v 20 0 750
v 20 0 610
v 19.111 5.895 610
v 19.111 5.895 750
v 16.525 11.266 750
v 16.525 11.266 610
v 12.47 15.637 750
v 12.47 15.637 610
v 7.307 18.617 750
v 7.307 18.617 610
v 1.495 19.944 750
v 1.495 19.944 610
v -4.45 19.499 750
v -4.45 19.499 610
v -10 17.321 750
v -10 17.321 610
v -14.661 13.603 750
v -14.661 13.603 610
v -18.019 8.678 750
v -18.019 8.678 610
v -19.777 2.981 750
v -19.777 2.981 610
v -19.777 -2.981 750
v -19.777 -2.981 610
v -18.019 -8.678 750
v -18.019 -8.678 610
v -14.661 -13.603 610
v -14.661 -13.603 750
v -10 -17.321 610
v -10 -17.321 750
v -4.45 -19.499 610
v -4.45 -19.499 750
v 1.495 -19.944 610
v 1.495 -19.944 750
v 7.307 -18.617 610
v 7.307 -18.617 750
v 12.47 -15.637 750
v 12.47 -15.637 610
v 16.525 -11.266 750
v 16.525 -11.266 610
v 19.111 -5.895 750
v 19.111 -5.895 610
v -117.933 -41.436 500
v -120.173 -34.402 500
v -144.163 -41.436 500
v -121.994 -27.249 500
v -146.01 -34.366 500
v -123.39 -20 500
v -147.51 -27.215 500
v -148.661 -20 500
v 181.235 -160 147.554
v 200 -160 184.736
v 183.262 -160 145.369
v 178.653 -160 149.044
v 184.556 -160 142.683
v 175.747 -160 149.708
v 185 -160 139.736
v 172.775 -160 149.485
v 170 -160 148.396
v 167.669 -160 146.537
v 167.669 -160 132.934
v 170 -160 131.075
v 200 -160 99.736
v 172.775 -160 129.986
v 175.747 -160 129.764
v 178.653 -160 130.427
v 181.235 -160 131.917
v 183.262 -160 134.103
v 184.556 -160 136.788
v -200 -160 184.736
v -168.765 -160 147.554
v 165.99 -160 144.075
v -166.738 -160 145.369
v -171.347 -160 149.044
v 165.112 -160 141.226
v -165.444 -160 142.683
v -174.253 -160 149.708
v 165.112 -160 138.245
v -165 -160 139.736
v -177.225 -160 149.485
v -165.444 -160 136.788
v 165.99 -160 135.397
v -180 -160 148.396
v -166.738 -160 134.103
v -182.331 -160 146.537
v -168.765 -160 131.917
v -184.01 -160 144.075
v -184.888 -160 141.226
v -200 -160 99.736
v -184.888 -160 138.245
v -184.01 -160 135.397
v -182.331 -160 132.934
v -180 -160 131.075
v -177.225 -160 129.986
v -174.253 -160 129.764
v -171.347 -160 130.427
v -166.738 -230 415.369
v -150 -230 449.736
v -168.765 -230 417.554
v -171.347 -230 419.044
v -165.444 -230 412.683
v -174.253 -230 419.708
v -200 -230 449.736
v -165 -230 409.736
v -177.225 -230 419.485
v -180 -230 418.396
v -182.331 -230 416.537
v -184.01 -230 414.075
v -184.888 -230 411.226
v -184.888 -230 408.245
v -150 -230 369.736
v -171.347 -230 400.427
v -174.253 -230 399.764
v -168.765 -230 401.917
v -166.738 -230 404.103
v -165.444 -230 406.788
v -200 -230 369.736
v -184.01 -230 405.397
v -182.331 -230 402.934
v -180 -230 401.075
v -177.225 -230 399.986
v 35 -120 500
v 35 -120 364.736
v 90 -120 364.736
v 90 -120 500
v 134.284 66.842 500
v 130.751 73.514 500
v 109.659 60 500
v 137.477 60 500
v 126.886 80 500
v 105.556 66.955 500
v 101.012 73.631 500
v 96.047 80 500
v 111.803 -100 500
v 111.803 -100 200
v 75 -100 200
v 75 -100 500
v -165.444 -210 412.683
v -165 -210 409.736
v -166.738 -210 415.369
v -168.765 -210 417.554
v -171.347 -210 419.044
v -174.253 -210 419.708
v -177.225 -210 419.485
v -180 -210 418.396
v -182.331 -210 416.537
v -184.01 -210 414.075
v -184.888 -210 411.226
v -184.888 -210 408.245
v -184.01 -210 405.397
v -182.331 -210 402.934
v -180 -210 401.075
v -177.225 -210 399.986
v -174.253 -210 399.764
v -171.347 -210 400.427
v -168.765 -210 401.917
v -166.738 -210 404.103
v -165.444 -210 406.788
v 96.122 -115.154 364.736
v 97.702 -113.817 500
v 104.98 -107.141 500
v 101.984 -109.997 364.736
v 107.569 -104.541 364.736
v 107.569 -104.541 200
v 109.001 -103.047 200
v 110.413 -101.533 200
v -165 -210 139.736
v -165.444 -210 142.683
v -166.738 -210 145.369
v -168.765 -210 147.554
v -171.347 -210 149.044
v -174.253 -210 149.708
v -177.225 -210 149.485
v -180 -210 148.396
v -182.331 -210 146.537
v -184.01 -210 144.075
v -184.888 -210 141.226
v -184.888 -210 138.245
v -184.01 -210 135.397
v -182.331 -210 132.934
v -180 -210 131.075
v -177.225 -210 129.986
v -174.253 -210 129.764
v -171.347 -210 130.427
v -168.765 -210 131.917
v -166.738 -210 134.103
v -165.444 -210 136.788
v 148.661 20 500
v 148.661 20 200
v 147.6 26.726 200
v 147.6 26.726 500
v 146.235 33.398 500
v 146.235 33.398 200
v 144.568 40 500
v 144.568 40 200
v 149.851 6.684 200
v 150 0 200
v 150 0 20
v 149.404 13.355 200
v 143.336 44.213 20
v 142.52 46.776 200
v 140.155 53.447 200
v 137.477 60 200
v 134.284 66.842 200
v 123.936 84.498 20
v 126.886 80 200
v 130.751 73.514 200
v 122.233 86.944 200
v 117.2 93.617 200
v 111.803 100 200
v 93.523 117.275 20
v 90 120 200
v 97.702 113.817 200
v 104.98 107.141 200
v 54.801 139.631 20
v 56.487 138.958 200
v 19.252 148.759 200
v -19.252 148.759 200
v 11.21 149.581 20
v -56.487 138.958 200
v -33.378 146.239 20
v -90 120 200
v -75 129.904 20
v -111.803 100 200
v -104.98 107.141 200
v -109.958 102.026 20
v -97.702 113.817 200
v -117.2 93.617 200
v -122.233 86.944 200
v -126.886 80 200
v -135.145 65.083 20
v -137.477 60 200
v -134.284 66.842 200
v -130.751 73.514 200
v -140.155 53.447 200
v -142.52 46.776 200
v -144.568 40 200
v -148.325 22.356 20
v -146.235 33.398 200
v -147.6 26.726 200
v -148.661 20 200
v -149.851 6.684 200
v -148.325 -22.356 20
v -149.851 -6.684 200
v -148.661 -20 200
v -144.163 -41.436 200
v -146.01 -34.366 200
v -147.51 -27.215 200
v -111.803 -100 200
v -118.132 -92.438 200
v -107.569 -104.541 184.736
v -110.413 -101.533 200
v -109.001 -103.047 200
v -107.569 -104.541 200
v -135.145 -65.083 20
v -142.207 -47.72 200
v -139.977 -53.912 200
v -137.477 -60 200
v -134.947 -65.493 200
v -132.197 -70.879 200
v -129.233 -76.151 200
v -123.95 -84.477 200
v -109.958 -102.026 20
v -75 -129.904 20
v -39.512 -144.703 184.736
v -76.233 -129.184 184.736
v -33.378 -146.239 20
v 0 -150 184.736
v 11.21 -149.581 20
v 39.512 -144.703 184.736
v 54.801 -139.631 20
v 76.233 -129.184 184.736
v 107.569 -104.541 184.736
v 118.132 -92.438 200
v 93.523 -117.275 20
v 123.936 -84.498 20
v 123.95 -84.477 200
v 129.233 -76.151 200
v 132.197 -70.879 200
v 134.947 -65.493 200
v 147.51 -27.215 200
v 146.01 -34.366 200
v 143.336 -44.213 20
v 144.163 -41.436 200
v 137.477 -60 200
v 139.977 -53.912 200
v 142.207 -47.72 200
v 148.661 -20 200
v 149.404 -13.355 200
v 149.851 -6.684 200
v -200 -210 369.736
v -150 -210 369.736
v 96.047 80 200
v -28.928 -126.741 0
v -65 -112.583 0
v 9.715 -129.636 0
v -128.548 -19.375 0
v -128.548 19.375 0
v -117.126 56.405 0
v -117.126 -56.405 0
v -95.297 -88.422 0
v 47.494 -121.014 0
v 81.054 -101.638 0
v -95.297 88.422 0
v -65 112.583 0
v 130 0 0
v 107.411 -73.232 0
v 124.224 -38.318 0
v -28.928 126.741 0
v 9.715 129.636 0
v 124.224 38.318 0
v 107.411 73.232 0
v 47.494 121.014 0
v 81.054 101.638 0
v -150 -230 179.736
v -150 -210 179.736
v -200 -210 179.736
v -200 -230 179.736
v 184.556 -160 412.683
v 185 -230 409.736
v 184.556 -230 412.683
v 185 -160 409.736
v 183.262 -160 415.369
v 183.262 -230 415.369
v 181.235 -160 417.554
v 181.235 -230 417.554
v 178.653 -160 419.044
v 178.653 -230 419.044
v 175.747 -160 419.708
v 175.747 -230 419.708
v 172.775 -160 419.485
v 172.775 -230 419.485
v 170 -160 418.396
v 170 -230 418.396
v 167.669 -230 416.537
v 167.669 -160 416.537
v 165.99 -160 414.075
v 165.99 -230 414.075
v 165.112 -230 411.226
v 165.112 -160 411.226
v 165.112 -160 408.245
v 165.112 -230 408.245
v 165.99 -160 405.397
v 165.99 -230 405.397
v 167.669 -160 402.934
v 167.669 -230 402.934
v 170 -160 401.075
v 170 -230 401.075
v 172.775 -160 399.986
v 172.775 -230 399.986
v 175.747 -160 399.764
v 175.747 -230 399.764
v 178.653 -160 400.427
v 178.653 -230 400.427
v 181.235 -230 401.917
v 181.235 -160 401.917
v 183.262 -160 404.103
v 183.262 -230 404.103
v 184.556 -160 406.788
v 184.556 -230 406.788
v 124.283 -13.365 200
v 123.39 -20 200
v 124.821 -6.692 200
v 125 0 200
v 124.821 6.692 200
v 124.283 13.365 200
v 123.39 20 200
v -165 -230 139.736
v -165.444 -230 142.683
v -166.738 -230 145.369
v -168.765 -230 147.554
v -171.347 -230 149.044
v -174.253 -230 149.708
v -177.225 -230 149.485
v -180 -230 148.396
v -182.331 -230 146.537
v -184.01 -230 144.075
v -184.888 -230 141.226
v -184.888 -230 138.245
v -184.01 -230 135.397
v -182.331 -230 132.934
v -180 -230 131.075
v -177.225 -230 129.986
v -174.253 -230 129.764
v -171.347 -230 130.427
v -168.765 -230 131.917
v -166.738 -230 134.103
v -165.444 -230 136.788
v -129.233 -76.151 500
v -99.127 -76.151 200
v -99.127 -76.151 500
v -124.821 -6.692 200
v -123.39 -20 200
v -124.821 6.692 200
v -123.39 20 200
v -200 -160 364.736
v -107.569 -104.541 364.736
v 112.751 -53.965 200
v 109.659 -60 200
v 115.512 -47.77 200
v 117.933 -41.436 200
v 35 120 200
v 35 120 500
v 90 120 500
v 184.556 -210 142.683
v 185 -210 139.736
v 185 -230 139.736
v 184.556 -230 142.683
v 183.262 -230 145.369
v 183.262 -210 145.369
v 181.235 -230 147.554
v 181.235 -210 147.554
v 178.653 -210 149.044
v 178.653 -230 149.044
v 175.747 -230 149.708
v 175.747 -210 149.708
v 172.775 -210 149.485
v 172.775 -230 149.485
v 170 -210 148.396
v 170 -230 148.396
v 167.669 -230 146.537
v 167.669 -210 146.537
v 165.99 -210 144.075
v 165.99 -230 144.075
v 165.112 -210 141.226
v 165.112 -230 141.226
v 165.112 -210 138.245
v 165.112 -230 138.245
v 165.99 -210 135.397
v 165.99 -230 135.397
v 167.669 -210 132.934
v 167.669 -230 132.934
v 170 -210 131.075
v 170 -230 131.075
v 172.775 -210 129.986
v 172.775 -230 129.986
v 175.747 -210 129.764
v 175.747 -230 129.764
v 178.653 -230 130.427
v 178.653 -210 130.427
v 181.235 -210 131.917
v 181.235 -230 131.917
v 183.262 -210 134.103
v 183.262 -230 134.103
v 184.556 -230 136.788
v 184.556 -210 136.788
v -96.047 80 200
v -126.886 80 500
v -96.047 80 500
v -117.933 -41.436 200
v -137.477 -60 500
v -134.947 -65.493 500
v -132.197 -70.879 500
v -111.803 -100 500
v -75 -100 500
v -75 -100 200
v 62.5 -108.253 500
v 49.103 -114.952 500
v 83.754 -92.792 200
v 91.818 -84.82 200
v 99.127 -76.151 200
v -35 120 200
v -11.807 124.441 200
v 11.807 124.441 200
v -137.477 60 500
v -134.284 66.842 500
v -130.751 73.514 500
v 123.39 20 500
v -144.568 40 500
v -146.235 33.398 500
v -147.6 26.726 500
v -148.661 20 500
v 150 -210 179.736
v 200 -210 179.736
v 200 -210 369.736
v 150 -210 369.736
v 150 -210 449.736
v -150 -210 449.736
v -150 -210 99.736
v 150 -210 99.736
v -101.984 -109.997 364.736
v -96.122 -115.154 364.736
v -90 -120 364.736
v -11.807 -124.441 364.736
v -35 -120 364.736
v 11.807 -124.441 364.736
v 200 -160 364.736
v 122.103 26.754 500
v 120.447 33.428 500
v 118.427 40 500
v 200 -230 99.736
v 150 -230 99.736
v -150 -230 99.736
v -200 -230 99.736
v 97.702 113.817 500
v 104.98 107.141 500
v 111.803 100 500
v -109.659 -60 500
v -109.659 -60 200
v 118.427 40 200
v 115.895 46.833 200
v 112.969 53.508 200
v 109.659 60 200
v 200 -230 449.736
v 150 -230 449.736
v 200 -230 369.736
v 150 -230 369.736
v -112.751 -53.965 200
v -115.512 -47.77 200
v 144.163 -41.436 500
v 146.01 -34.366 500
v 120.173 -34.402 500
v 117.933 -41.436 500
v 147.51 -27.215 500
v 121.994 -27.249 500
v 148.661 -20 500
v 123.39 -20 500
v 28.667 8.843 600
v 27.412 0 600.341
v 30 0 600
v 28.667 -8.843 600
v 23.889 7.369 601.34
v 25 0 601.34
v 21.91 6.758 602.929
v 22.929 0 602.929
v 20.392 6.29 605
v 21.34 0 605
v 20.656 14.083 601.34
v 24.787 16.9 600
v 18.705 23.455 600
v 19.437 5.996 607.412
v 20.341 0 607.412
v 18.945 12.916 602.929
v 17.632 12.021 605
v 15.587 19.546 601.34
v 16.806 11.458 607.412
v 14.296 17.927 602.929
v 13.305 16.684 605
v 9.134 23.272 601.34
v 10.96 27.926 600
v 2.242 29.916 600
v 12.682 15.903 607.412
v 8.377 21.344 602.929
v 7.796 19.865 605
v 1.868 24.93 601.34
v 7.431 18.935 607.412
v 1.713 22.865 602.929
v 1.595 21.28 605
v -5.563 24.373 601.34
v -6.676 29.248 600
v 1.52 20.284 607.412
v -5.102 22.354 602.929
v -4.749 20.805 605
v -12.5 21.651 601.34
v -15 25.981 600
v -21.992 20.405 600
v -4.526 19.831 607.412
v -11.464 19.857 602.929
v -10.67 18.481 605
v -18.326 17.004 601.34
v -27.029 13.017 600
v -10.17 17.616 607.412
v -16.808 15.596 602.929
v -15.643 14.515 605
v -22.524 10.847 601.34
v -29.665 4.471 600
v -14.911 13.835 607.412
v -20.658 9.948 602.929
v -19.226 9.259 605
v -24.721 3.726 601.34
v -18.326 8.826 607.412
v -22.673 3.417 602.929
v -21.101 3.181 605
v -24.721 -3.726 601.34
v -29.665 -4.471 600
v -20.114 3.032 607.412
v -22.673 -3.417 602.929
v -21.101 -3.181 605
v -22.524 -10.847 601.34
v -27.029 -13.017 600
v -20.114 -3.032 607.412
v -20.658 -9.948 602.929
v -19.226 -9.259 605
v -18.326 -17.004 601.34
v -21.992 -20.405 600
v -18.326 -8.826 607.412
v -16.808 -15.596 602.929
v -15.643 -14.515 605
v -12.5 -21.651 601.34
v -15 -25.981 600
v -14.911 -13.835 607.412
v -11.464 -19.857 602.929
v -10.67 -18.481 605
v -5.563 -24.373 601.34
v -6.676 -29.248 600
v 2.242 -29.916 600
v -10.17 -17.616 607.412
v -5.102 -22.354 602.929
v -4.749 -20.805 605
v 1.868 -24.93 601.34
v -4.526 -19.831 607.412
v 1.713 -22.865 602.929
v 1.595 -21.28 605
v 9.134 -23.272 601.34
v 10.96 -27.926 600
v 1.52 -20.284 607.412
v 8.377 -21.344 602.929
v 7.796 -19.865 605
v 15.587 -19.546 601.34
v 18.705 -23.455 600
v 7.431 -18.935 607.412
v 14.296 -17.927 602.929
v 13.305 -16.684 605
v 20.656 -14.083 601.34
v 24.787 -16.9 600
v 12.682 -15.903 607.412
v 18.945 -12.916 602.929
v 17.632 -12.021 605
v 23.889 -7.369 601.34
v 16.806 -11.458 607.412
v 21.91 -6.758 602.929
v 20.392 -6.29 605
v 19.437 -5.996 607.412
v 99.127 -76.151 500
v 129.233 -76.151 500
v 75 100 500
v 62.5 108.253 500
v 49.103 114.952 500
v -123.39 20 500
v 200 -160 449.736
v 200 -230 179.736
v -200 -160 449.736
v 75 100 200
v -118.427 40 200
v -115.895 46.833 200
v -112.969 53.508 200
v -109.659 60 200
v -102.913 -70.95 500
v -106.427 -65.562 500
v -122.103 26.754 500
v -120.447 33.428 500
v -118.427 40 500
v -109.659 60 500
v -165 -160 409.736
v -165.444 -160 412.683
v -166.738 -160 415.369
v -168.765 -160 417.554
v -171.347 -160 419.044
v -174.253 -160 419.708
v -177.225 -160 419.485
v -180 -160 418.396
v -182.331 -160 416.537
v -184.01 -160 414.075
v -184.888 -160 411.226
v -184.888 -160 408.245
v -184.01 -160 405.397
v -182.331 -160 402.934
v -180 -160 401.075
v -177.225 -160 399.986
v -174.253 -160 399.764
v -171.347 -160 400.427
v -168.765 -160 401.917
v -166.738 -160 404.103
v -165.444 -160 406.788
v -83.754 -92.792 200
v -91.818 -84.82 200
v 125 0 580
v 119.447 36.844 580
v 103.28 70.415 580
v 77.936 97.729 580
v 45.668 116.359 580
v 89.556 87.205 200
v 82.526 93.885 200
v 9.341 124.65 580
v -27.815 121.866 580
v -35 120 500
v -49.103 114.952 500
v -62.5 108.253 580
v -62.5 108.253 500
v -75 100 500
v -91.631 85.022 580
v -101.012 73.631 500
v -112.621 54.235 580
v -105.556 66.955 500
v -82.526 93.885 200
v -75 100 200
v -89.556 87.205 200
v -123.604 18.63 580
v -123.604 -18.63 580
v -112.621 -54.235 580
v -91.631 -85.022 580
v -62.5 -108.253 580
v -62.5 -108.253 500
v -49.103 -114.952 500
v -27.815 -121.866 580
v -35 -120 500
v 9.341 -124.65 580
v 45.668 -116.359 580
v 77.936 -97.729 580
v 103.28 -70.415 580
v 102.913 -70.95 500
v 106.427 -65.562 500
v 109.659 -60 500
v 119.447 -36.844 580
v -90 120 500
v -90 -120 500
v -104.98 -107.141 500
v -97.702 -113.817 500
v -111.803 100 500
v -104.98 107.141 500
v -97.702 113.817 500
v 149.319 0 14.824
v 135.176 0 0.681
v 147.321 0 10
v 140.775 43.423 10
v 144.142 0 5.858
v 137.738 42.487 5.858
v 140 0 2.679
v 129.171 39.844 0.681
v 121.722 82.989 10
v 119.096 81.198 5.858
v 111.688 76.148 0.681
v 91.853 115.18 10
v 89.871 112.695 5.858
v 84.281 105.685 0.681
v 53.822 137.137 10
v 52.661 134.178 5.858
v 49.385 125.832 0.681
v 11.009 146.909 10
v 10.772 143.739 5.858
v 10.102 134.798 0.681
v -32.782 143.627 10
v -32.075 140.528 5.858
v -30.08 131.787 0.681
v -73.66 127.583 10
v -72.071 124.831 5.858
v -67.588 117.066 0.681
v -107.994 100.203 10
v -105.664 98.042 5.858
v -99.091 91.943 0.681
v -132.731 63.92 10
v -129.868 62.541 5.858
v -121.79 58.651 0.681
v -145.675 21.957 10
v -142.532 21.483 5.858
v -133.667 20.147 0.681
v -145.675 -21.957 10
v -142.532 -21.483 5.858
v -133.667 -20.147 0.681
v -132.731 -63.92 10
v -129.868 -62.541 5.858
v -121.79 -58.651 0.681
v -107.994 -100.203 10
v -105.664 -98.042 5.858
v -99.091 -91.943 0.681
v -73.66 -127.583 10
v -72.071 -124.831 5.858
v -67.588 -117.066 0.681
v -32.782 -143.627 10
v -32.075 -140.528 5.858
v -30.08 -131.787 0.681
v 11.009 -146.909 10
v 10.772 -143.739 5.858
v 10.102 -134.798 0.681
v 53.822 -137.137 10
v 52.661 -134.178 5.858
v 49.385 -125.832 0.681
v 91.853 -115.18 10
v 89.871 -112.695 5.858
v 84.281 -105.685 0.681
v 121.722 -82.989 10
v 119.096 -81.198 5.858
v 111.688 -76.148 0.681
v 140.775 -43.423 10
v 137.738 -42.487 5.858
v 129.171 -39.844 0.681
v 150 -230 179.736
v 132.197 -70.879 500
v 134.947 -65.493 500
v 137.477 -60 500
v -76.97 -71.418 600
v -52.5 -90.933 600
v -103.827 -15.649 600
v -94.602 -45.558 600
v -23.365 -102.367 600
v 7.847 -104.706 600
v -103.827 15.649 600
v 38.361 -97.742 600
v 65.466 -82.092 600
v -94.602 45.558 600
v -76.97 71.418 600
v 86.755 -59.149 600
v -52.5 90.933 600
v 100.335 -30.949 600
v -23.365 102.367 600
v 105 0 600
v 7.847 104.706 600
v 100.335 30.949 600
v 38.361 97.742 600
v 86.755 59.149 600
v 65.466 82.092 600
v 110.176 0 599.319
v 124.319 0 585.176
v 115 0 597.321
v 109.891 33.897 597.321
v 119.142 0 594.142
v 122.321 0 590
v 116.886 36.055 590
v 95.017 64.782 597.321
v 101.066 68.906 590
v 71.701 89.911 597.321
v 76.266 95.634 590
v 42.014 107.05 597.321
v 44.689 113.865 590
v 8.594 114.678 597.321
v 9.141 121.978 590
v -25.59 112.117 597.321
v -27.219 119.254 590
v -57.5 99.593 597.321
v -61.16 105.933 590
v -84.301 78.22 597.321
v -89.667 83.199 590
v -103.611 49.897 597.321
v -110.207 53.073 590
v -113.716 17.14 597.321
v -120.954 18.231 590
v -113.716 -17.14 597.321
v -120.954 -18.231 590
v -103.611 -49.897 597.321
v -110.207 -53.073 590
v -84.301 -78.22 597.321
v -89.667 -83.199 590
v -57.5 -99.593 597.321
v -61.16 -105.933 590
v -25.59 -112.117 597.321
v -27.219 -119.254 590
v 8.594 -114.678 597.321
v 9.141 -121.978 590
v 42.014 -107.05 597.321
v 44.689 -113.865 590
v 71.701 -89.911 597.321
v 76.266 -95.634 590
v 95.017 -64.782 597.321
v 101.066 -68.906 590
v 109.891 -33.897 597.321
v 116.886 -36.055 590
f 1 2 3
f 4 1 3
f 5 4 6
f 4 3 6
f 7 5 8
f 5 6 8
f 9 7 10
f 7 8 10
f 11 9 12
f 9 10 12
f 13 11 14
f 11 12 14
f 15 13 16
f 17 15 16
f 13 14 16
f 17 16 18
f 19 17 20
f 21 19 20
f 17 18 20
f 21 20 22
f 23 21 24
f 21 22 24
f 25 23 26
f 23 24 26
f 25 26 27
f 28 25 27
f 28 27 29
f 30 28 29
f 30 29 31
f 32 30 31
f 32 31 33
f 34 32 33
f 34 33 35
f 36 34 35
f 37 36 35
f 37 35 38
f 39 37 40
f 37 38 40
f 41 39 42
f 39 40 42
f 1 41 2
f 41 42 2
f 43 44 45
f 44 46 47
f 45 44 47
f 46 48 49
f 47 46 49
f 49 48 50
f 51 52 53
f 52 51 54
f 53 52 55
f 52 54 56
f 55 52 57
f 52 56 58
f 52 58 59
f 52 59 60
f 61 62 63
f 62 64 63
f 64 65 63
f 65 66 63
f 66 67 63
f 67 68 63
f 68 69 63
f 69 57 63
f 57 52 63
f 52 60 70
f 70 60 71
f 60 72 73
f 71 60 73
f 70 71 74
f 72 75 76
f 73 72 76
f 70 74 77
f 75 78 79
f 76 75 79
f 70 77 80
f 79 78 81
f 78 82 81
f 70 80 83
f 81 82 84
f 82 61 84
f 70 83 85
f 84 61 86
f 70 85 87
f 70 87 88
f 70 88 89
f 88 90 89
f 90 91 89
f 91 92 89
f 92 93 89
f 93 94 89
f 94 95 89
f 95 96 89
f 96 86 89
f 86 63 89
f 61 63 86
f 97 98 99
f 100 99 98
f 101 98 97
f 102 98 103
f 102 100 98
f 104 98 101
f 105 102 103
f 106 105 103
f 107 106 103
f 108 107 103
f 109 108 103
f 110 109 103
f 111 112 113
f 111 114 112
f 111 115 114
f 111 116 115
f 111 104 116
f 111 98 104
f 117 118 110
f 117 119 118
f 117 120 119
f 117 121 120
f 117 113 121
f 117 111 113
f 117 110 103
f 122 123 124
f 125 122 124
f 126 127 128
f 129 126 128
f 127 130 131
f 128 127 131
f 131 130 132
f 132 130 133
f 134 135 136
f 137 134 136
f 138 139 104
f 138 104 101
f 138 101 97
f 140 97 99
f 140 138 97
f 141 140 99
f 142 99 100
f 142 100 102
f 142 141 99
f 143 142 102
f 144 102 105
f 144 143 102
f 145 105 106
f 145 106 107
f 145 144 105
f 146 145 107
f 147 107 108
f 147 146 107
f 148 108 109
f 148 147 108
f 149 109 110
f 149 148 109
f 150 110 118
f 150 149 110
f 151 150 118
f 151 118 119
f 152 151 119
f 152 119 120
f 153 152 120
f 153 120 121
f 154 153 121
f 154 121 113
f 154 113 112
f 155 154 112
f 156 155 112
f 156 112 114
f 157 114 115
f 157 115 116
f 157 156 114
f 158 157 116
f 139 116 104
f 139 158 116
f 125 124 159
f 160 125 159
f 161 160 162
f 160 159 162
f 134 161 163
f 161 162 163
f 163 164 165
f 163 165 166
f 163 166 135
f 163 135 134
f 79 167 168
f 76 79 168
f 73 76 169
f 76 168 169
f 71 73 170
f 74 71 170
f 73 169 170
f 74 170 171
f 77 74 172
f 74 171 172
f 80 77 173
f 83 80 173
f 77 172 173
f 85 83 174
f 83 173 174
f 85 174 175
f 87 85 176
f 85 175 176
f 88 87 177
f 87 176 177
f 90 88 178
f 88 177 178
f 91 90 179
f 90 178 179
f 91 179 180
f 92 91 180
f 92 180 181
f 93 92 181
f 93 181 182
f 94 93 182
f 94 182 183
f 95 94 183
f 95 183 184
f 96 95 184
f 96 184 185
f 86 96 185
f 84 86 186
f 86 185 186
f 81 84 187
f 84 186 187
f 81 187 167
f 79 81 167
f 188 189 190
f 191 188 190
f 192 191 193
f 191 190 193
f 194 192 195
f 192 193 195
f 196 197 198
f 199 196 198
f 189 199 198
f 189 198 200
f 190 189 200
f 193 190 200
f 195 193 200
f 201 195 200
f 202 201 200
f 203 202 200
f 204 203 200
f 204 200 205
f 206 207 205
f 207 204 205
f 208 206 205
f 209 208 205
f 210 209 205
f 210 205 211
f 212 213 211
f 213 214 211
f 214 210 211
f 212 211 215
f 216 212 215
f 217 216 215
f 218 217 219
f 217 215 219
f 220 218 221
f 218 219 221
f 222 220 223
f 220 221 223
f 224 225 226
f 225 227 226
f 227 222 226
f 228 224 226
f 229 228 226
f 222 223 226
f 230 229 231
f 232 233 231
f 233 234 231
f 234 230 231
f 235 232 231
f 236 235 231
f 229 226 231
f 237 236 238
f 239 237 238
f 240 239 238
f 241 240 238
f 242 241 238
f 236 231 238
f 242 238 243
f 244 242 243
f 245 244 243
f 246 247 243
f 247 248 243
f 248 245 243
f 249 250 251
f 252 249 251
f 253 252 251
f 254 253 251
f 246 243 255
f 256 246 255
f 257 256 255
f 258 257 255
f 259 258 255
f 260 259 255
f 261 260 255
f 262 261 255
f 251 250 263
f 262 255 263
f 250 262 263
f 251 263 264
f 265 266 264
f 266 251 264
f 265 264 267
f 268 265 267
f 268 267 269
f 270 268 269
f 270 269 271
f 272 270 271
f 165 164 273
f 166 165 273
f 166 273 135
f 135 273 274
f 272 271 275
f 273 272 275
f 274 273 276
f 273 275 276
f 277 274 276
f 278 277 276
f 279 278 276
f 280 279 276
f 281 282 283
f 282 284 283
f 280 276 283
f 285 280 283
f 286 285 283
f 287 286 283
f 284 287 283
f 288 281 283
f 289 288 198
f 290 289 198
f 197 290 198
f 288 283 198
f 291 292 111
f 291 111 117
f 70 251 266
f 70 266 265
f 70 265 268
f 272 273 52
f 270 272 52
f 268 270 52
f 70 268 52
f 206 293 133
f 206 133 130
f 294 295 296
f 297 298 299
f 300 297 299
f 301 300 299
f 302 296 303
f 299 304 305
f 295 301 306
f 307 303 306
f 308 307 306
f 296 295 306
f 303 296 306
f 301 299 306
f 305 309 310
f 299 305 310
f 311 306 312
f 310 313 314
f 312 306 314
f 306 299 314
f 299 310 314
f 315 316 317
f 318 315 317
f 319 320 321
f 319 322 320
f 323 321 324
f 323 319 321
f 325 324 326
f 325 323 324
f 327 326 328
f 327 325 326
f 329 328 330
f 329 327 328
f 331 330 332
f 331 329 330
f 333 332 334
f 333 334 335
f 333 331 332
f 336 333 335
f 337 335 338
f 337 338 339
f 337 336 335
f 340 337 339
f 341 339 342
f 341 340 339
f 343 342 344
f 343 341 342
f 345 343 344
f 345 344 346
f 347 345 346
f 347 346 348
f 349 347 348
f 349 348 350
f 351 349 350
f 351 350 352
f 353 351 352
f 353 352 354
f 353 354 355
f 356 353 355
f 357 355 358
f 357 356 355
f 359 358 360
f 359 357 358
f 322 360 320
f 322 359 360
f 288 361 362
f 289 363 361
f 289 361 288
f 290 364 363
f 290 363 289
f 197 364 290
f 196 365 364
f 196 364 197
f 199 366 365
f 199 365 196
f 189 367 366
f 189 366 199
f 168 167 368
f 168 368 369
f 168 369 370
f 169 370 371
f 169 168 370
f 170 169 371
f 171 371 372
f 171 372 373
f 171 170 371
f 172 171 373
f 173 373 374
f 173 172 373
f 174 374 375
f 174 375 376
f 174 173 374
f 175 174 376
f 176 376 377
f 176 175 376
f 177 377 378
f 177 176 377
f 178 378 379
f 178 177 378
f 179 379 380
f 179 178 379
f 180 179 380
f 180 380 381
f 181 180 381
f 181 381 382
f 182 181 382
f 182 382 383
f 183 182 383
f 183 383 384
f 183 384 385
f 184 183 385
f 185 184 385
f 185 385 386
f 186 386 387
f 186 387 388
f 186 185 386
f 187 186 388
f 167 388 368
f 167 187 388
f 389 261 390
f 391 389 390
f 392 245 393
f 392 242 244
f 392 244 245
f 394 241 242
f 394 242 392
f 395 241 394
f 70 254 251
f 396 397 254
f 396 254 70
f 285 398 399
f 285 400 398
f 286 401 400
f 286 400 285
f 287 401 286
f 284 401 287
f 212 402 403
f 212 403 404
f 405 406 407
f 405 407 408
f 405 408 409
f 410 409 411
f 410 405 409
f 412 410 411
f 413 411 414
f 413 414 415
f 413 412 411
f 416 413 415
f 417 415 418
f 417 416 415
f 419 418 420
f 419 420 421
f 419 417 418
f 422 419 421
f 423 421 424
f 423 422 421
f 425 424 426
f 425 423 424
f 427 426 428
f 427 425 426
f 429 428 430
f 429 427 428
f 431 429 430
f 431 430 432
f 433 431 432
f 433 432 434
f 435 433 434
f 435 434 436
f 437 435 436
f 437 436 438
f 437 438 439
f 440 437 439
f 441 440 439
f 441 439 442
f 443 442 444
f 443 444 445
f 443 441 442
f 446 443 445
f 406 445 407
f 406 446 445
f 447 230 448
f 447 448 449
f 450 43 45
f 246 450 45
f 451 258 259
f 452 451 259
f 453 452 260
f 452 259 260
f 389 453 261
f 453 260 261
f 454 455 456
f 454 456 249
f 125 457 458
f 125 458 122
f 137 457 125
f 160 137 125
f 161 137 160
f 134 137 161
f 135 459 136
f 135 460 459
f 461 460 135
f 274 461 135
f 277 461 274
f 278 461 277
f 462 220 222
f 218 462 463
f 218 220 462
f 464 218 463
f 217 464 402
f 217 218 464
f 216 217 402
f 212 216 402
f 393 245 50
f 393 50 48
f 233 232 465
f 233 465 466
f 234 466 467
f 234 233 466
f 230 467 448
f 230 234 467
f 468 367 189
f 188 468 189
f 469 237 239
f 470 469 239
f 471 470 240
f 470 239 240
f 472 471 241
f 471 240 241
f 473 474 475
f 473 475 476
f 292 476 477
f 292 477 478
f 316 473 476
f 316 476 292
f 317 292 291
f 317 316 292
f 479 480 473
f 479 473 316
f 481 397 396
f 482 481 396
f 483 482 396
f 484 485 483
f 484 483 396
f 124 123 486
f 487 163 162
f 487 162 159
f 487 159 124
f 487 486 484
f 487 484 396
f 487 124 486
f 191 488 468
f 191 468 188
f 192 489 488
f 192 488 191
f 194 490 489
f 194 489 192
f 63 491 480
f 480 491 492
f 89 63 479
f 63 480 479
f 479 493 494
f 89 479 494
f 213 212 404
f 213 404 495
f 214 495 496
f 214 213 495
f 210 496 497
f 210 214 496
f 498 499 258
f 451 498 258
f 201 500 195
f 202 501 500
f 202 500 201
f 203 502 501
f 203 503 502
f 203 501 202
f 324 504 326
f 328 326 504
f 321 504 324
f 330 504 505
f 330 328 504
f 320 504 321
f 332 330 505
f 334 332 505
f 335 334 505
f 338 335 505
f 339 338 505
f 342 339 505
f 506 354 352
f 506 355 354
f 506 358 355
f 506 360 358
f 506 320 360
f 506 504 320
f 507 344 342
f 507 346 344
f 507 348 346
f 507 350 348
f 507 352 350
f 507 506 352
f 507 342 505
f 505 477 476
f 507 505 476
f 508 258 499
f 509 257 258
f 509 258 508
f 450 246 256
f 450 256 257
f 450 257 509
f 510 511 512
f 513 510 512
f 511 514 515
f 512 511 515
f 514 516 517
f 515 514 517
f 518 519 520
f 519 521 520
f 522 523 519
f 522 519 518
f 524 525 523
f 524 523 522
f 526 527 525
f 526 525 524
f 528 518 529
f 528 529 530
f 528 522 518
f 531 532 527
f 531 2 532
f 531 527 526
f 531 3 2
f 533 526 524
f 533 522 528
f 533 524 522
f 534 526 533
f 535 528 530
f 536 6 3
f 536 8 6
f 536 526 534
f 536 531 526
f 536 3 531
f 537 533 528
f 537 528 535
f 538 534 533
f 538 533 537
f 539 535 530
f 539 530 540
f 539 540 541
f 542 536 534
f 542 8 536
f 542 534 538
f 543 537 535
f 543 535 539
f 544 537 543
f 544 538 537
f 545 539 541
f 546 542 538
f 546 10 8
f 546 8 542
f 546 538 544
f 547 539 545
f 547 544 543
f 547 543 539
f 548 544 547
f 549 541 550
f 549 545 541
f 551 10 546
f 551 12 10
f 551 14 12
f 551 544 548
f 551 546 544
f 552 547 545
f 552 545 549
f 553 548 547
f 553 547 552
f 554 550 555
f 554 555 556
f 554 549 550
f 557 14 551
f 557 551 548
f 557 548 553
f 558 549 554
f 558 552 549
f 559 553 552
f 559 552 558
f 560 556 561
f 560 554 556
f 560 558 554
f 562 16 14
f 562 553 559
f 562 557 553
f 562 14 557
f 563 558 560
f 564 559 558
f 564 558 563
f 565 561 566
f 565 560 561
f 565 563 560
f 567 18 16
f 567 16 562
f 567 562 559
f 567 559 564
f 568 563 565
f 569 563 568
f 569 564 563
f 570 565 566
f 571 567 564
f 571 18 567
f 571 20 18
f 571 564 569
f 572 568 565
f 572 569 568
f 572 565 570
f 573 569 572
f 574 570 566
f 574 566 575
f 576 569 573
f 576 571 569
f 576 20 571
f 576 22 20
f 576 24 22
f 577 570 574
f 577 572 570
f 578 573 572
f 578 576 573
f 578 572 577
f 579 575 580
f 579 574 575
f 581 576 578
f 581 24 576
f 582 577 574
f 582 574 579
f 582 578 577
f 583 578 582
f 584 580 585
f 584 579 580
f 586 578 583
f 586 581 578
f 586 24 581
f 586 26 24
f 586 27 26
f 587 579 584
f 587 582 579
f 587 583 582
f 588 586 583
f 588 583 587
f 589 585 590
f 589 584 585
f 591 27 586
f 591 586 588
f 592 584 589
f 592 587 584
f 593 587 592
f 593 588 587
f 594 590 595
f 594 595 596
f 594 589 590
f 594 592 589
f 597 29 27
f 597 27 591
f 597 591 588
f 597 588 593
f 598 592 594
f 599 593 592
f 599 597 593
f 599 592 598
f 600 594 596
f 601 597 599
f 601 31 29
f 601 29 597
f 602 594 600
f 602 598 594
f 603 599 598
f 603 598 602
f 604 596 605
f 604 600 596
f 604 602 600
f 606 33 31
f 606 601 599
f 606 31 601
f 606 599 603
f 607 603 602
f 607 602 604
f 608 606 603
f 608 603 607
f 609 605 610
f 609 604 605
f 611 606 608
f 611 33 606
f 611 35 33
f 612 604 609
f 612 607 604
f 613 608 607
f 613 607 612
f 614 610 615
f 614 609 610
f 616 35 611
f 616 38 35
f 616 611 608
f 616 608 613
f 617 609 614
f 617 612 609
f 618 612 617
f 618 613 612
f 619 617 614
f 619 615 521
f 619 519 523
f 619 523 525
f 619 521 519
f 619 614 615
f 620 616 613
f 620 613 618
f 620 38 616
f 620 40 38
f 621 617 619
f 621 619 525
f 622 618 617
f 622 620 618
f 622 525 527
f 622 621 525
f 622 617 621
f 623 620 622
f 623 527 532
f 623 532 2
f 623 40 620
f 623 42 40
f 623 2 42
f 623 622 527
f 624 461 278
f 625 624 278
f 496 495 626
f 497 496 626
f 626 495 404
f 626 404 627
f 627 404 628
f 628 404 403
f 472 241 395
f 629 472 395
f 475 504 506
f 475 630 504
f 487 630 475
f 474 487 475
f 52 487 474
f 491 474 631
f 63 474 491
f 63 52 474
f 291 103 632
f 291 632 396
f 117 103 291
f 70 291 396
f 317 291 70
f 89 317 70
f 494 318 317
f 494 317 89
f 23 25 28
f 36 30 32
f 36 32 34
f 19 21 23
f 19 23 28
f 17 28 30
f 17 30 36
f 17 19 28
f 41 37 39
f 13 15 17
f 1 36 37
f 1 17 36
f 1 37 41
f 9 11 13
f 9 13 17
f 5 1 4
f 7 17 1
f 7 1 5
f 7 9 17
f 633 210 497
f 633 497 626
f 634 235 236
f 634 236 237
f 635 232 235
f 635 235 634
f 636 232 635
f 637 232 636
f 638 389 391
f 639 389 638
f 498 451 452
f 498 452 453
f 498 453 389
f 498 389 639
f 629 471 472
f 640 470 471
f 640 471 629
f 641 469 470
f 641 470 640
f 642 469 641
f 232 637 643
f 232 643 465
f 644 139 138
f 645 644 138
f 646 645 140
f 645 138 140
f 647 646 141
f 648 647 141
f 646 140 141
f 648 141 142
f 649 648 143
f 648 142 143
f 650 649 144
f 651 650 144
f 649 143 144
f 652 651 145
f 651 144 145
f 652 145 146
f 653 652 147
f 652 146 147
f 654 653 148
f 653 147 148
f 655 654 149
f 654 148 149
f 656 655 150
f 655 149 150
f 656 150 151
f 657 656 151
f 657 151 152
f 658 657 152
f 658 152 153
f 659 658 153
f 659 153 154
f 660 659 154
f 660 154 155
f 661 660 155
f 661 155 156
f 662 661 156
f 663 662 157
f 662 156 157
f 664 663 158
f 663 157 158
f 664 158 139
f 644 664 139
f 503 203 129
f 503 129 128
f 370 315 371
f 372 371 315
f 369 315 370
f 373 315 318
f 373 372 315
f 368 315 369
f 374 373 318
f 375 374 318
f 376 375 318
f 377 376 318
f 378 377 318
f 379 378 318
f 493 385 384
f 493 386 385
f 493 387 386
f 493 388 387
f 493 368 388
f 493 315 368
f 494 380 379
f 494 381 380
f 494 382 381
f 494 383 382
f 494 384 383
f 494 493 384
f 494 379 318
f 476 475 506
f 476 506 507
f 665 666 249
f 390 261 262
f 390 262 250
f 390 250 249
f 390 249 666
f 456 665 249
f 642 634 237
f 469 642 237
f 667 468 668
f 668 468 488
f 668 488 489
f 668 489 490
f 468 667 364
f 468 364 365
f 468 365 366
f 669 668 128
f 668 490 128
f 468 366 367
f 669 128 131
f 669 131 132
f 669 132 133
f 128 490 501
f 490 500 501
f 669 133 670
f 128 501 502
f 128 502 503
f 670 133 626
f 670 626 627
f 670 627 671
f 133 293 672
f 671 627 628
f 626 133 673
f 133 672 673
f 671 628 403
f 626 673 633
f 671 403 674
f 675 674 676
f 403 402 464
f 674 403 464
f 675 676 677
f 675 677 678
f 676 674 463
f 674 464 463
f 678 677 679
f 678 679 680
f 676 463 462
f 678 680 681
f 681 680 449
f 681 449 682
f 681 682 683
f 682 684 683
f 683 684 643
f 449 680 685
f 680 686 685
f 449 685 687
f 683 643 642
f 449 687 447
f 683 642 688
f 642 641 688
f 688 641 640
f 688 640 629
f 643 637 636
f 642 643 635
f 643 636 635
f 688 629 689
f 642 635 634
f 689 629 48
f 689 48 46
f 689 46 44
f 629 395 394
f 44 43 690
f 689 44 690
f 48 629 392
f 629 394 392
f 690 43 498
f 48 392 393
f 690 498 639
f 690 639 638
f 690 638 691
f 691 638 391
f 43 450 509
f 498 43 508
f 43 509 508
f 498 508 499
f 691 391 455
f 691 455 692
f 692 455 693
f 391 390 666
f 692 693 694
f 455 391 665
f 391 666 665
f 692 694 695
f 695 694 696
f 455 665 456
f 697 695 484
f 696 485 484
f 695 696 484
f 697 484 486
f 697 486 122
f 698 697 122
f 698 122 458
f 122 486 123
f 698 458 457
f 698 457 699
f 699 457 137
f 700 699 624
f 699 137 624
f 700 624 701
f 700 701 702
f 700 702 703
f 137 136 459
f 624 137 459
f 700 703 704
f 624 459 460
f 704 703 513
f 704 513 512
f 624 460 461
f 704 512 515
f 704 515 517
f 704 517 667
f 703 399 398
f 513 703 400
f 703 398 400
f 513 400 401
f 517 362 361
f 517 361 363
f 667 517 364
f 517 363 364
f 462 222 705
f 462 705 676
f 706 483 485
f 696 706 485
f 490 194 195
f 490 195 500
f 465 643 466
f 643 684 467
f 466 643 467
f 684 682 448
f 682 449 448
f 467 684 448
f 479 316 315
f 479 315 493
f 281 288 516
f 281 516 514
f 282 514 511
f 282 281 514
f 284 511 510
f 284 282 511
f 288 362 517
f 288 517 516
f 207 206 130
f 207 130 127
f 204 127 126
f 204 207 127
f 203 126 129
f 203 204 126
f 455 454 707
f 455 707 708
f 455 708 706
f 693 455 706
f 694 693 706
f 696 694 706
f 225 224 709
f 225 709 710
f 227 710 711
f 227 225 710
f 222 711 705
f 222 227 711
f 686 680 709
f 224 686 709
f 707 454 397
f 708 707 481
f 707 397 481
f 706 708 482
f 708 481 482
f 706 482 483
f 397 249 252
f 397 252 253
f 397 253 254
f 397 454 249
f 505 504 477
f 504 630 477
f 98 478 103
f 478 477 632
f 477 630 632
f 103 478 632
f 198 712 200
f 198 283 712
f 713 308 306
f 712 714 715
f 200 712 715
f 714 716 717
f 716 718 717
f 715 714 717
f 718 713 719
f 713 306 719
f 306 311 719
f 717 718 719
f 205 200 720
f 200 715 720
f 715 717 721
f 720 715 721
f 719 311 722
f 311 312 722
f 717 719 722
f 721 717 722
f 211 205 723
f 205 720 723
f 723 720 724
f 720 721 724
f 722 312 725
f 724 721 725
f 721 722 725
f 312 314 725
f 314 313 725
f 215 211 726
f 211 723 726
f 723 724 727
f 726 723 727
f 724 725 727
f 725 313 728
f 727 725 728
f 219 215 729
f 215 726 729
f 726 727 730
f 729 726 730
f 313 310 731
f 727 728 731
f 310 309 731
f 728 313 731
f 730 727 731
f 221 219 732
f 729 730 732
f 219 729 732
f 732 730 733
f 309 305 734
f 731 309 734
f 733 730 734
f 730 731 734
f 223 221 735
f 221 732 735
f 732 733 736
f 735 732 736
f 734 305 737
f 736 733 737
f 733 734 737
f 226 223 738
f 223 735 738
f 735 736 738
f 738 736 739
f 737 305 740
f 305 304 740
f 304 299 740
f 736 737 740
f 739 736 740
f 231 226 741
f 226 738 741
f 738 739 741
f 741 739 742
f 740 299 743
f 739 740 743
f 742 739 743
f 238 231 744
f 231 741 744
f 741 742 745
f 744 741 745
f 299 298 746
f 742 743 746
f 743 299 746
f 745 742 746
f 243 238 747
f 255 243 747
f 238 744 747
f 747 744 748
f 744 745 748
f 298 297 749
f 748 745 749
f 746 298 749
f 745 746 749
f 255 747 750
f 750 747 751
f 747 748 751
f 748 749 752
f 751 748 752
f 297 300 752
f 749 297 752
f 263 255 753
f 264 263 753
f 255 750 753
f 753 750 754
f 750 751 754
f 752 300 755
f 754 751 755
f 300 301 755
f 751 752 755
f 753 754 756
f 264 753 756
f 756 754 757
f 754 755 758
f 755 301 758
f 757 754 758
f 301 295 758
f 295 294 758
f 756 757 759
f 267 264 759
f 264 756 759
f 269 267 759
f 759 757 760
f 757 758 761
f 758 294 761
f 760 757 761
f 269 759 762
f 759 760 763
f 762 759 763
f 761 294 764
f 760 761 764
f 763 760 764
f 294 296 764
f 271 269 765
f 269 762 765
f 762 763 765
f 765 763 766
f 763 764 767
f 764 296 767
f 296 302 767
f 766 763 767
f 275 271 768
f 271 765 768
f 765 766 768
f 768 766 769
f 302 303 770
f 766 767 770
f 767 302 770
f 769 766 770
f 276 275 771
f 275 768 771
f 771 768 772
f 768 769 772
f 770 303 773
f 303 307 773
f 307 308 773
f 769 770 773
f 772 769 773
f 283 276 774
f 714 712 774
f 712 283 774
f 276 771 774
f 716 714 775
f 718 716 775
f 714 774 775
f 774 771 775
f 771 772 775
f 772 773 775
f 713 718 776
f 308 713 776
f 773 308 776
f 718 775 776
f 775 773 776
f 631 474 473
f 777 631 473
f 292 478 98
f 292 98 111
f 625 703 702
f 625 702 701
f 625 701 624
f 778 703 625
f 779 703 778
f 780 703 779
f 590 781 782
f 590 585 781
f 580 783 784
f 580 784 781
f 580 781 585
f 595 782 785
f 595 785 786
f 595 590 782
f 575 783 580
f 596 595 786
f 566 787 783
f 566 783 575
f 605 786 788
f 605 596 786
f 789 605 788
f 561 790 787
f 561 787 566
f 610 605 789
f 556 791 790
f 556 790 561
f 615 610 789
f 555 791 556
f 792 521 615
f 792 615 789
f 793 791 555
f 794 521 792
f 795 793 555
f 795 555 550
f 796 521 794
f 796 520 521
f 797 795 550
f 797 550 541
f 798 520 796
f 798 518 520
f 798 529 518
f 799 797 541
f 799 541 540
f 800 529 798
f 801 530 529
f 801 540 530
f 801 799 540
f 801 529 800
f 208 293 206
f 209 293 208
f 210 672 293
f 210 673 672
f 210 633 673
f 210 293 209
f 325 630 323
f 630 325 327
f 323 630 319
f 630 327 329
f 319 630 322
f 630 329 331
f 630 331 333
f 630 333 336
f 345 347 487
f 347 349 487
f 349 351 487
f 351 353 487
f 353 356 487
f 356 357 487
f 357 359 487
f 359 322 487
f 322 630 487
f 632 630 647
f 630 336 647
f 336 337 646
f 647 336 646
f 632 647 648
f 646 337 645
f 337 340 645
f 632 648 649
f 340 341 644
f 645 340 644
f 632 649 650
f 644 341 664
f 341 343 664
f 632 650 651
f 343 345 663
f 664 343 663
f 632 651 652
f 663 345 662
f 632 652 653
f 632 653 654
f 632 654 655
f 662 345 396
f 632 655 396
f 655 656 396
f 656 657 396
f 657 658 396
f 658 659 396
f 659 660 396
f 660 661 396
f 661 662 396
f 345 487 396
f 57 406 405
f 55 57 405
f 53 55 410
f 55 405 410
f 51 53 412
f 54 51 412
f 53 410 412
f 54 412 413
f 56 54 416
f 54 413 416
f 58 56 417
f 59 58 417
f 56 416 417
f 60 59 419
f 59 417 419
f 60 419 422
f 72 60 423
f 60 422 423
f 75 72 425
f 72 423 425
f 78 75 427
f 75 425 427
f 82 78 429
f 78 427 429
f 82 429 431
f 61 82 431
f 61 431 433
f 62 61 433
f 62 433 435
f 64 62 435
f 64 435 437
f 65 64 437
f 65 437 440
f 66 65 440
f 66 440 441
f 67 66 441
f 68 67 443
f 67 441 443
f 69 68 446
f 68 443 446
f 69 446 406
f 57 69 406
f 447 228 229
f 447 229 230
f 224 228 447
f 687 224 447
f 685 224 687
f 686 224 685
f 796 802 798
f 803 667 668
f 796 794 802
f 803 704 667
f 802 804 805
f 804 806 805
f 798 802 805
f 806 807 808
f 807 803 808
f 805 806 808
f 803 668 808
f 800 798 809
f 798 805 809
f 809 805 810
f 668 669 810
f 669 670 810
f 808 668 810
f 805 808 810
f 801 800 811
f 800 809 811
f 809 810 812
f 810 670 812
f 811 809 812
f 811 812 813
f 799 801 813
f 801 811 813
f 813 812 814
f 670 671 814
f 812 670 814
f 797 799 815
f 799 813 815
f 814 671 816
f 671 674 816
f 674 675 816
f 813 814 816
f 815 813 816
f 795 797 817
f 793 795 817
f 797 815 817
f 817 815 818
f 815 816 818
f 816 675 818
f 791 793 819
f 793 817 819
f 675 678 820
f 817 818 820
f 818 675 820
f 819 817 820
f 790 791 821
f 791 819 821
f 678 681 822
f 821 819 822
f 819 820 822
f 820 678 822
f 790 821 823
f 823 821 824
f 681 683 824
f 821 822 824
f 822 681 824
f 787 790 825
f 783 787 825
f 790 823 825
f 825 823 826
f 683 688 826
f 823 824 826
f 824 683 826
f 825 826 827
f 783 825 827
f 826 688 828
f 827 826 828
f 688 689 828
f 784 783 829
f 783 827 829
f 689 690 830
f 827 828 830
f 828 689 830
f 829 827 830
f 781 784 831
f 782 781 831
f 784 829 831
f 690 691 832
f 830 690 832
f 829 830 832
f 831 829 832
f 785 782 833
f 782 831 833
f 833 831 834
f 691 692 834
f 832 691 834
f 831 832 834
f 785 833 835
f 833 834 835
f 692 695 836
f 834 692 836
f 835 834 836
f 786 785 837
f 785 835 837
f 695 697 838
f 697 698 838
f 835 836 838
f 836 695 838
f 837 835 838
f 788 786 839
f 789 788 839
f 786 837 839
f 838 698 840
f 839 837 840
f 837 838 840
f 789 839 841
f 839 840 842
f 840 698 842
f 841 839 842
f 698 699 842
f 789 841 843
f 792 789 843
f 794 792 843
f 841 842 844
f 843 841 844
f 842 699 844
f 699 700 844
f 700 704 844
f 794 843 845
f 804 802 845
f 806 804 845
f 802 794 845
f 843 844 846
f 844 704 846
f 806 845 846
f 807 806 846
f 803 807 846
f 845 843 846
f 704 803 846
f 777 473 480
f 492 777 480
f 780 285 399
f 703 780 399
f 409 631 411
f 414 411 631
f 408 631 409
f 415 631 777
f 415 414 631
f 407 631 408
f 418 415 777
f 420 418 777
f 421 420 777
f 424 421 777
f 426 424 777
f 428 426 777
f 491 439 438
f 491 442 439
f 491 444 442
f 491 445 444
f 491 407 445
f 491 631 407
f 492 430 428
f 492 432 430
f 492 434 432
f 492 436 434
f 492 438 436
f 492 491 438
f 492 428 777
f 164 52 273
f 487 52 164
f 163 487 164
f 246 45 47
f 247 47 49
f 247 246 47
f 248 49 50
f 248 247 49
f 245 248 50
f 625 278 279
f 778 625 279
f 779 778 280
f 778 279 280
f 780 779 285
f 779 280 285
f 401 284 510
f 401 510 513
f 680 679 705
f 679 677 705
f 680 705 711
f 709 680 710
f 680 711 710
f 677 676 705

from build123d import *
from build123d.topology import SkipClean

# Parameters (mm, degrees)
SKETCH1_R            = 150
BOSS_EXTRUDE1_DEPTH  = 200
BOSS_EXTRUDE11_DEPTH = 300
BOSS_EXTRUDE14_START = -300
SKETCH12_R           = 125
BOSS_EXTRUDE14_DEPTH = 400
SKETCH13_W           = 400
SKETCH13_H           = 350
SKETCH13_R           = 10
BOSS_EXTRUDE15_DEPTH = 50
SKETCH13_3_W         = 50
SKETCH13_3_H         = 80
SKETCH13_3_R         = 10
BOSS_EXTRUDE16_DEPTH = 20
BOSS_EXTRUDE17_DEPTH = 90
SKETCH16_R           = 20
BOSS_EXTRUDE18_DEPTH = 150
FILLET2_R            = 10
FILLET3_R            = 20


with BuildPart() as part:
    # Sketch1 → Boss-Extrude1 (new body)
    with BuildSketch(Plane.XY):
        Circle(SKETCH1_R)
    extrude(amount=BOSS_EXTRUDE1_DEPTH)

    # Sketch7 → Boss-Extrude11 (add)
    with SkipClean():  # the faces are left unmerged after this step: merging them gives an invalid solid
        with BuildSketch(Plane.XY.offset(200)):
            with BuildLine():
                Line((-90, 120), (90, 120))
                ThreePointArc((90, 120), (101.396020382, 110.538893837), (111.803398875, 100))
                Line((111.803398875, 100), (-111.803398875, 100))
                ThreePointArc((-111.803398875, 100), (-101.396020382, 110.538893837), (-90, 120))
            make_face()
            with BuildLine():
                Line((-126.885775404, 80), (126.885775404, 80))
                ThreePointArc((126.885775404, 80), (132.559251115, 70.200035213), (137.477270849, 60))
                Line((137.477270849, 60), (-137.477270849, 60))
                ThreePointArc((-137.477270849, 60), (-132.559251115, 70.200035213), (-126.885775404, 80))
            make_face()
            with BuildLine():
                Line((144.16342013, -41.435592144), (-144.16342013, -41.435592144))
                ThreePointArc((-144.16342013, -41.435592144), (-146.803816882, -30.799989431), (-148.660687473, -20))
                Line((-148.660687473, -20), (148.660687473, -20))
                ThreePointArc((148.660687473, -20), (146.803816882, -30.799989431), (144.16342013, -41.435592144))
            make_face()
            with BuildLine():
                Line((111.803398875, -100), (-111.803398875, -100))
                ThreePointArc((-111.803398875, -100), (-101.396020382, -110.538893837), (-90, -120))
                Line((-90, -120), (90, -120))
                ThreePointArc((90, -120), (101.396020382, -110.538893837), (111.803398875, -100))
            make_face()
            with BuildLine():
                Line((144.568322948, 40), (-144.568322948, 40))
                ThreePointArc((-144.568322948, 40), (-146.955139883, 30.069700063), (-148.660687473, 20))
                Line((-148.660687473, 20), (148.660687473, 20))
                ThreePointArc((148.660687473, 20), (146.955139883, 30.069700063), (144.568322948, 40))
            make_face()
            with BuildLine():
                Line((137.477270849, -60), (-137.477270849, -60))
                ThreePointArc((-137.477270849, -60), (-133.599215205, -68.20007109), (-129.232599216, -76.150740639))
                Line((-129.232599216, -76.150740639), (129.232599216, -76.150740639))
                ThreePointArc((129.232599216, -76.150740639), (133.599215205, -68.20007109), (137.477270849, -60))
            make_face()
        extrude(amount=BOSS_EXTRUDE11_DEPTH)



with BuildPart() as body_2:
    # Sketch12 → Boss-Extrude14 (new body)
    with BuildSketch(Plane.XY.offset(500).offset(BOSS_EXTRUDE14_START)):
        Circle(SKETCH12_R)
    extrude(amount=BOSS_EXTRUDE14_DEPTH)


with BuildPart() as body_3:
    # Sketch13 → Boss-Extrude15 (new body)
    with BuildSketch(Plane(origin=(0, -210, 0), x_dir=(-1, 0, 0), z_dir=(0, -1, 0))):
        with Locations((0, -274.735715433)):
            Rectangle(SKETCH13_W, SKETCH13_H)
        with Locations(Location((-175, -139.735715433, 0), (0, 0, 180))):
            Circle(SKETCH13_R, mode=Mode.SUBTRACT)
        with Locations(Location((175, -139.735715433, 0), (0, 0, 180))):
            Circle(SKETCH13_R, mode=Mode.SUBTRACT)
        with Locations(Location((175, -409.735715433, 0), (0, 0, 180))):
            Circle(SKETCH13_R, mode=Mode.SUBTRACT)
        with Locations(Location((-175, -409.735715433, 0), (0, 0, 180))):
            Circle(SKETCH13_R, mode=Mode.SUBTRACT)
    extrude(amount=-BOSS_EXTRUDE15_DEPTH)

    # Sketch13<3> → Boss-Extrude16 (add)
    # profile 1 of 4: a face of its own
    with BuildSketch(Plane(origin=(0, -210, 0), x_dir=(-1, 0, 0), z_dir=(0, -1, 0))):
        with Locations((-175, -409.735715433)):
            Rectangle(SKETCH13_3_W, SKETCH13_3_H)
        with Locations(Location((-175, -409.735715433, 0), (0, 0, 180))):
            Circle(SKETCH13_3_R, mode=Mode.SUBTRACT)
    # profile 2 of 4: a face of its own
    with BuildSketch(Plane(origin=(0, -210, 0), x_dir=(-1, 0, 0), z_dir=(0, -1, 0))):
        with Locations((-175, -139.735715433)):
            Rectangle(SKETCH13_3_W, SKETCH13_3_H)
        with Locations(Location((-175, -139.735715433, 0), (0, 0, 180))):
            Circle(SKETCH13_3_R, mode=Mode.SUBTRACT)
    # profile 3 of 4: a face of its own
    with BuildSketch(Plane(origin=(0, -210, 0), x_dir=(-1, 0, 0), z_dir=(0, -1, 0))):
        with Locations((175, -409.735715433)):
            Rectangle(SKETCH13_3_W, SKETCH13_3_H)
        with Locations(Location((175, -409.735715433, 0), (0, 0, 180))):
            Circle(SKETCH13_3_R, mode=Mode.SUBTRACT)
    # profile 4 of 4: a face of its own
    with BuildSketch(Plane(origin=(0, -210, 0), x_dir=(-1, 0, 0), z_dir=(0, -1, 0))):
        with Locations((175, -139.735715433)):
            Rectangle(SKETCH13_3_W, SKETCH13_3_H)
        with Locations(Location((175, -139.735715433, 0), (0, 0, 180))):
            Circle(SKETCH13_3_R, mode=Mode.SUBTRACT)
    extrude(amount=BOSS_EXTRUDE16_DEPTH)


with BuildPart() as part_1:
    with SkipClean():  # the faces are left unmerged after this step: merging them gives an invalid solid
        add(part.part)

        add(body_2.part)  # Boss-Extrude17 merges body 2

        add(body_3.part)  # Boss-Extrude17 merges body 3
        # Sketch14 → Boss-Extrude17 (add, symmetric)
        with BuildSketch(Plane.XY.offset(274.735715433)):
            Polygon((-200, -160), (200, -160), (100, -100), (-100, -100), align=None)
        extrude(amount=BOSS_EXTRUDE17_DEPTH, both=True)

    # Sketch16 → Boss-Extrude18 (add)
    with BuildSketch(Plane.XY.offset(600)):
        Circle(SKETCH16_R)
    extrude(amount=BOSS_EXTRUDE18_DEPTH)

    # Fillet2
    fillet2_edges = [part_1.edges().sort_by_distance(p)[0] for p in [
        (-20, 0, 600),
    ]]
    fillet(fillet2_edges, radius=FILLET2_R)

    # Fillet3
    fillet3_edges = [part_1.edges().sort_by_distance(p)[0] for p in [
        (-125, 0, 600),
        (-150, 0, 0),
    ]]
    fillet(fillet3_edges, radius=FILLET3_R)


solid = part_1.part
